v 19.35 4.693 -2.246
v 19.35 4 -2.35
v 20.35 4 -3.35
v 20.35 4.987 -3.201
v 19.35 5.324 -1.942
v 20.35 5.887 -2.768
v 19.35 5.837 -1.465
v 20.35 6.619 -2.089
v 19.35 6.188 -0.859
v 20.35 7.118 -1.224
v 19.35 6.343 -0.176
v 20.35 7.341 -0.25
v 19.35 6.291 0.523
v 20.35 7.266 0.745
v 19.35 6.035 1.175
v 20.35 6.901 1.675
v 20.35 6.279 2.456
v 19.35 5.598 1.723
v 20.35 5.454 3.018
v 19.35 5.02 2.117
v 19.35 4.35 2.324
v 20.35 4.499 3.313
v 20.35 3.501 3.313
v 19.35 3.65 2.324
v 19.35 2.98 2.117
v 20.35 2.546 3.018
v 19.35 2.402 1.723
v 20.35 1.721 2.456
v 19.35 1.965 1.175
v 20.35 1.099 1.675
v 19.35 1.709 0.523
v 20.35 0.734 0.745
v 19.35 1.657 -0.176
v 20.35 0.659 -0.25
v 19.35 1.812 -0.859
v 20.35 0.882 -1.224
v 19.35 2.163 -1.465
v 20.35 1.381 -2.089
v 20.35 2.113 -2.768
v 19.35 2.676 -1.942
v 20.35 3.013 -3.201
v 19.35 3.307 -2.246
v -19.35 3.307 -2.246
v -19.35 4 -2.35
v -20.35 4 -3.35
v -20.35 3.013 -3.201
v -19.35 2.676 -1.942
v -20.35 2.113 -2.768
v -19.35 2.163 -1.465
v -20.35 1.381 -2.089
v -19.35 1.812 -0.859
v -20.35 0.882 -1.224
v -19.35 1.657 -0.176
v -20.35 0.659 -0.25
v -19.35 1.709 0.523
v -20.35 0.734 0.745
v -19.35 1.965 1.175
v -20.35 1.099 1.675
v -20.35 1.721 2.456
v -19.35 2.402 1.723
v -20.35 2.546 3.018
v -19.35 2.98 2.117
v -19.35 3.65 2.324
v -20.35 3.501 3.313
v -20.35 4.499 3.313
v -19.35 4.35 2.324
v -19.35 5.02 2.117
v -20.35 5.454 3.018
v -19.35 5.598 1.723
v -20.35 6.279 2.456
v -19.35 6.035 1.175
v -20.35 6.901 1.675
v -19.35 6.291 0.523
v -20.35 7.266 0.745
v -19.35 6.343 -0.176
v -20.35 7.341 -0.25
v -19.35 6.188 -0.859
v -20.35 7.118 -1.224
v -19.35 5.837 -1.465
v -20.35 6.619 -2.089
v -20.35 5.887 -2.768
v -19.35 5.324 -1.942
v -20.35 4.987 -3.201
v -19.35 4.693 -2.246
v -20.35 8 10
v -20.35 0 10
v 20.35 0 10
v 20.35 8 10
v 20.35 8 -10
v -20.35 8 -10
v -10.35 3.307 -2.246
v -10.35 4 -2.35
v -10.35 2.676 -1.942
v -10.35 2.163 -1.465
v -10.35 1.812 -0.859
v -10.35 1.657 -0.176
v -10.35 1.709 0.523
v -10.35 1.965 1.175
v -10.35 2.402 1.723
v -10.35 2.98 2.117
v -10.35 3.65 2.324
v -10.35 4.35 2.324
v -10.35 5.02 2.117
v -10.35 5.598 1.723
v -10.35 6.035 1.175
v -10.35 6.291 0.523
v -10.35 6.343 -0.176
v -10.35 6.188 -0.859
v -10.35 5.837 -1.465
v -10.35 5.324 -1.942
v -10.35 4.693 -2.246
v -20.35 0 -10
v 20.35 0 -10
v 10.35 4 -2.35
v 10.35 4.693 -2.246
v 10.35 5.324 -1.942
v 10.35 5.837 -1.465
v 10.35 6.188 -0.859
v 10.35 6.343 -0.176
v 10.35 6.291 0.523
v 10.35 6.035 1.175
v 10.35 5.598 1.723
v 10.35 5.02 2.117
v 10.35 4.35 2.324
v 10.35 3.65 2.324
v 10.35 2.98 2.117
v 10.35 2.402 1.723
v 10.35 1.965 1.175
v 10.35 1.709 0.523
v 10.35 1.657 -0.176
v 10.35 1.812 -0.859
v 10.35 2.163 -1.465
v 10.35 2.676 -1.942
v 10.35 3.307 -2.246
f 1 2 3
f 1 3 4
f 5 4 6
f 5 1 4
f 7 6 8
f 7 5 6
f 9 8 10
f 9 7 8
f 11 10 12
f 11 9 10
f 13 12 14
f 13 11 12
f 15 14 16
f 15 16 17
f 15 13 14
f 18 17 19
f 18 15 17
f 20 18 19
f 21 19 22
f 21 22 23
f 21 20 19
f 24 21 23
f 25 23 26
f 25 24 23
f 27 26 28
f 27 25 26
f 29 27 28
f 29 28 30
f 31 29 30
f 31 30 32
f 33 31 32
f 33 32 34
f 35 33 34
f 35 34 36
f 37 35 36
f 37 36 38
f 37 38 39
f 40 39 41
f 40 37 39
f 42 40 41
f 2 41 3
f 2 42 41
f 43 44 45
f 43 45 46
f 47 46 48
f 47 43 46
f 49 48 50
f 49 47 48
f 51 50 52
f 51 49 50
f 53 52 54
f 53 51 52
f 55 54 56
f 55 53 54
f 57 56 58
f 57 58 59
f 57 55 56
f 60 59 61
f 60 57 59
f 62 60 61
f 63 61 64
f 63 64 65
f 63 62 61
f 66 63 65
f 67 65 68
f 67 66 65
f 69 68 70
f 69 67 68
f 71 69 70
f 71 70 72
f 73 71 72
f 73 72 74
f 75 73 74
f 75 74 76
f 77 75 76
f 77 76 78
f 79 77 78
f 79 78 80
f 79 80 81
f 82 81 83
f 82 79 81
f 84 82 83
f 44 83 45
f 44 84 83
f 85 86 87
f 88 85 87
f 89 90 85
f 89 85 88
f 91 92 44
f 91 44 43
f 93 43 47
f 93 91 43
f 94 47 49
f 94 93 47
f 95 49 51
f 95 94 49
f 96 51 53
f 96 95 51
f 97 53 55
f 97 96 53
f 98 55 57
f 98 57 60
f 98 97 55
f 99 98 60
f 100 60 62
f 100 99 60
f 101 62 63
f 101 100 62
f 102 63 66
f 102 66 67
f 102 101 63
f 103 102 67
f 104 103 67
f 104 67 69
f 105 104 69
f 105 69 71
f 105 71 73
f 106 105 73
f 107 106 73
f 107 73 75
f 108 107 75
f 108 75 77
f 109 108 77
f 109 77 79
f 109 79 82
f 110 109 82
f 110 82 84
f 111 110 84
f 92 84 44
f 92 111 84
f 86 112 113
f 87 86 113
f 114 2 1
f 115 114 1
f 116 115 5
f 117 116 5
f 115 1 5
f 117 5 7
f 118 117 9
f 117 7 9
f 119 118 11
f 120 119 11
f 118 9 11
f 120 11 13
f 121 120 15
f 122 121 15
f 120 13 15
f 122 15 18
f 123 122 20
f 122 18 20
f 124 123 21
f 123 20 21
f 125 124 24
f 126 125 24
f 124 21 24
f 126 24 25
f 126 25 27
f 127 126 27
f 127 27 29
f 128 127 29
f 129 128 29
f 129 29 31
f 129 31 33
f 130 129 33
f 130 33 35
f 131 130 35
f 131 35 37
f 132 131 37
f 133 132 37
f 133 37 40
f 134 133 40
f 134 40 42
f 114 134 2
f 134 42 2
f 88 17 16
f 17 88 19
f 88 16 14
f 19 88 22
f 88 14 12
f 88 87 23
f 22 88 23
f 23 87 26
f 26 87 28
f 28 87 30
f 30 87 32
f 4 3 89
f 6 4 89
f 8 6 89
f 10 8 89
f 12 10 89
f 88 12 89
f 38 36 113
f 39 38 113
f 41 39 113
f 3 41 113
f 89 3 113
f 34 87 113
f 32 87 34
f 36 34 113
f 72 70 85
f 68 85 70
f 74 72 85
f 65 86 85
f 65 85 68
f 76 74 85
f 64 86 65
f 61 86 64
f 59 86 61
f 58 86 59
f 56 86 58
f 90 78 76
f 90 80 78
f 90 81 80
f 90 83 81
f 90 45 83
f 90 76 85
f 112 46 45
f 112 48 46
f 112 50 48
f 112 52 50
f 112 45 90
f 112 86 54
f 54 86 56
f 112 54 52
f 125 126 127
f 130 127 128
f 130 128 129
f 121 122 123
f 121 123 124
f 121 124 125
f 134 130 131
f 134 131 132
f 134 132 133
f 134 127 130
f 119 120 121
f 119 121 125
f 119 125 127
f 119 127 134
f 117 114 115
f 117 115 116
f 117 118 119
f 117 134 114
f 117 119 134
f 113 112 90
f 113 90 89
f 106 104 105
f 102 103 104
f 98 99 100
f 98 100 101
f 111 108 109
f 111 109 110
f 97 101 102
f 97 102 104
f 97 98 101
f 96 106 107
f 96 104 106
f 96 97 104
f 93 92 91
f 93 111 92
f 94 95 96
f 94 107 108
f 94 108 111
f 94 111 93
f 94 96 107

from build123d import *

# Parameters (mm, degrees)
SKETCH1_W           = 40.7
SKETCH1_H           = 20
BOSS_EXTRUDE1_DEPTH = 8
SKETCH2_R           = 2.35
CUT_EXTRUDE1_DEPTH  = 10
CUT_EXTRUDE2_START  = -10
SKETCH3_R           = 2.35
CUT_EXTRUDE2_DEPTH  = 10
CHAMFER1_SIZE       = 1


with BuildPart() as part:
    # Sketch1 → Boss-Extrude1 (new body)
    with BuildSketch(Plane(origin=(0, 0, 0), x_dir=(1, 0, 0), z_dir=(0, 1, 0))):
        Rectangle(SKETCH1_W, SKETCH1_H)
    extrude(amount=BOSS_EXTRUDE1_DEPTH)

    # Sketch2 → Cut-Extrude1 (cut)
    with BuildSketch(Plane(origin=(20.35, 0, 0), x_dir=(0, 0, -1), z_dir=(1, 0, 0))):
        with Locations((0, 4)):
            Circle(SKETCH2_R)
    extrude(amount=-CUT_EXTRUDE1_DEPTH, mode=Mode.SUBTRACT)

    # Sketch3 → Cut-Extrude2 (cut)
    with BuildSketch(Plane.ZY.offset(20.35).offset(CUT_EXTRUDE2_START)):
        with Locations(Location((0, 4, 0), (0, 0, 180))):
            Circle(SKETCH3_R)
    extrude(amount=CUT_EXTRUDE2_DEPTH, mode=Mode.SUBTRACT)

    # Chamfer1
    chamfer1_edges = [part.edges().sort_by_distance(p)[0] for p in [
        (20.35, 4, 2.35),
        (-20.35, 4, 2.35),
    ]]
    chamfer(chamfer1_edges, length=CHAMFER1_SIZE)


solid = part.part
